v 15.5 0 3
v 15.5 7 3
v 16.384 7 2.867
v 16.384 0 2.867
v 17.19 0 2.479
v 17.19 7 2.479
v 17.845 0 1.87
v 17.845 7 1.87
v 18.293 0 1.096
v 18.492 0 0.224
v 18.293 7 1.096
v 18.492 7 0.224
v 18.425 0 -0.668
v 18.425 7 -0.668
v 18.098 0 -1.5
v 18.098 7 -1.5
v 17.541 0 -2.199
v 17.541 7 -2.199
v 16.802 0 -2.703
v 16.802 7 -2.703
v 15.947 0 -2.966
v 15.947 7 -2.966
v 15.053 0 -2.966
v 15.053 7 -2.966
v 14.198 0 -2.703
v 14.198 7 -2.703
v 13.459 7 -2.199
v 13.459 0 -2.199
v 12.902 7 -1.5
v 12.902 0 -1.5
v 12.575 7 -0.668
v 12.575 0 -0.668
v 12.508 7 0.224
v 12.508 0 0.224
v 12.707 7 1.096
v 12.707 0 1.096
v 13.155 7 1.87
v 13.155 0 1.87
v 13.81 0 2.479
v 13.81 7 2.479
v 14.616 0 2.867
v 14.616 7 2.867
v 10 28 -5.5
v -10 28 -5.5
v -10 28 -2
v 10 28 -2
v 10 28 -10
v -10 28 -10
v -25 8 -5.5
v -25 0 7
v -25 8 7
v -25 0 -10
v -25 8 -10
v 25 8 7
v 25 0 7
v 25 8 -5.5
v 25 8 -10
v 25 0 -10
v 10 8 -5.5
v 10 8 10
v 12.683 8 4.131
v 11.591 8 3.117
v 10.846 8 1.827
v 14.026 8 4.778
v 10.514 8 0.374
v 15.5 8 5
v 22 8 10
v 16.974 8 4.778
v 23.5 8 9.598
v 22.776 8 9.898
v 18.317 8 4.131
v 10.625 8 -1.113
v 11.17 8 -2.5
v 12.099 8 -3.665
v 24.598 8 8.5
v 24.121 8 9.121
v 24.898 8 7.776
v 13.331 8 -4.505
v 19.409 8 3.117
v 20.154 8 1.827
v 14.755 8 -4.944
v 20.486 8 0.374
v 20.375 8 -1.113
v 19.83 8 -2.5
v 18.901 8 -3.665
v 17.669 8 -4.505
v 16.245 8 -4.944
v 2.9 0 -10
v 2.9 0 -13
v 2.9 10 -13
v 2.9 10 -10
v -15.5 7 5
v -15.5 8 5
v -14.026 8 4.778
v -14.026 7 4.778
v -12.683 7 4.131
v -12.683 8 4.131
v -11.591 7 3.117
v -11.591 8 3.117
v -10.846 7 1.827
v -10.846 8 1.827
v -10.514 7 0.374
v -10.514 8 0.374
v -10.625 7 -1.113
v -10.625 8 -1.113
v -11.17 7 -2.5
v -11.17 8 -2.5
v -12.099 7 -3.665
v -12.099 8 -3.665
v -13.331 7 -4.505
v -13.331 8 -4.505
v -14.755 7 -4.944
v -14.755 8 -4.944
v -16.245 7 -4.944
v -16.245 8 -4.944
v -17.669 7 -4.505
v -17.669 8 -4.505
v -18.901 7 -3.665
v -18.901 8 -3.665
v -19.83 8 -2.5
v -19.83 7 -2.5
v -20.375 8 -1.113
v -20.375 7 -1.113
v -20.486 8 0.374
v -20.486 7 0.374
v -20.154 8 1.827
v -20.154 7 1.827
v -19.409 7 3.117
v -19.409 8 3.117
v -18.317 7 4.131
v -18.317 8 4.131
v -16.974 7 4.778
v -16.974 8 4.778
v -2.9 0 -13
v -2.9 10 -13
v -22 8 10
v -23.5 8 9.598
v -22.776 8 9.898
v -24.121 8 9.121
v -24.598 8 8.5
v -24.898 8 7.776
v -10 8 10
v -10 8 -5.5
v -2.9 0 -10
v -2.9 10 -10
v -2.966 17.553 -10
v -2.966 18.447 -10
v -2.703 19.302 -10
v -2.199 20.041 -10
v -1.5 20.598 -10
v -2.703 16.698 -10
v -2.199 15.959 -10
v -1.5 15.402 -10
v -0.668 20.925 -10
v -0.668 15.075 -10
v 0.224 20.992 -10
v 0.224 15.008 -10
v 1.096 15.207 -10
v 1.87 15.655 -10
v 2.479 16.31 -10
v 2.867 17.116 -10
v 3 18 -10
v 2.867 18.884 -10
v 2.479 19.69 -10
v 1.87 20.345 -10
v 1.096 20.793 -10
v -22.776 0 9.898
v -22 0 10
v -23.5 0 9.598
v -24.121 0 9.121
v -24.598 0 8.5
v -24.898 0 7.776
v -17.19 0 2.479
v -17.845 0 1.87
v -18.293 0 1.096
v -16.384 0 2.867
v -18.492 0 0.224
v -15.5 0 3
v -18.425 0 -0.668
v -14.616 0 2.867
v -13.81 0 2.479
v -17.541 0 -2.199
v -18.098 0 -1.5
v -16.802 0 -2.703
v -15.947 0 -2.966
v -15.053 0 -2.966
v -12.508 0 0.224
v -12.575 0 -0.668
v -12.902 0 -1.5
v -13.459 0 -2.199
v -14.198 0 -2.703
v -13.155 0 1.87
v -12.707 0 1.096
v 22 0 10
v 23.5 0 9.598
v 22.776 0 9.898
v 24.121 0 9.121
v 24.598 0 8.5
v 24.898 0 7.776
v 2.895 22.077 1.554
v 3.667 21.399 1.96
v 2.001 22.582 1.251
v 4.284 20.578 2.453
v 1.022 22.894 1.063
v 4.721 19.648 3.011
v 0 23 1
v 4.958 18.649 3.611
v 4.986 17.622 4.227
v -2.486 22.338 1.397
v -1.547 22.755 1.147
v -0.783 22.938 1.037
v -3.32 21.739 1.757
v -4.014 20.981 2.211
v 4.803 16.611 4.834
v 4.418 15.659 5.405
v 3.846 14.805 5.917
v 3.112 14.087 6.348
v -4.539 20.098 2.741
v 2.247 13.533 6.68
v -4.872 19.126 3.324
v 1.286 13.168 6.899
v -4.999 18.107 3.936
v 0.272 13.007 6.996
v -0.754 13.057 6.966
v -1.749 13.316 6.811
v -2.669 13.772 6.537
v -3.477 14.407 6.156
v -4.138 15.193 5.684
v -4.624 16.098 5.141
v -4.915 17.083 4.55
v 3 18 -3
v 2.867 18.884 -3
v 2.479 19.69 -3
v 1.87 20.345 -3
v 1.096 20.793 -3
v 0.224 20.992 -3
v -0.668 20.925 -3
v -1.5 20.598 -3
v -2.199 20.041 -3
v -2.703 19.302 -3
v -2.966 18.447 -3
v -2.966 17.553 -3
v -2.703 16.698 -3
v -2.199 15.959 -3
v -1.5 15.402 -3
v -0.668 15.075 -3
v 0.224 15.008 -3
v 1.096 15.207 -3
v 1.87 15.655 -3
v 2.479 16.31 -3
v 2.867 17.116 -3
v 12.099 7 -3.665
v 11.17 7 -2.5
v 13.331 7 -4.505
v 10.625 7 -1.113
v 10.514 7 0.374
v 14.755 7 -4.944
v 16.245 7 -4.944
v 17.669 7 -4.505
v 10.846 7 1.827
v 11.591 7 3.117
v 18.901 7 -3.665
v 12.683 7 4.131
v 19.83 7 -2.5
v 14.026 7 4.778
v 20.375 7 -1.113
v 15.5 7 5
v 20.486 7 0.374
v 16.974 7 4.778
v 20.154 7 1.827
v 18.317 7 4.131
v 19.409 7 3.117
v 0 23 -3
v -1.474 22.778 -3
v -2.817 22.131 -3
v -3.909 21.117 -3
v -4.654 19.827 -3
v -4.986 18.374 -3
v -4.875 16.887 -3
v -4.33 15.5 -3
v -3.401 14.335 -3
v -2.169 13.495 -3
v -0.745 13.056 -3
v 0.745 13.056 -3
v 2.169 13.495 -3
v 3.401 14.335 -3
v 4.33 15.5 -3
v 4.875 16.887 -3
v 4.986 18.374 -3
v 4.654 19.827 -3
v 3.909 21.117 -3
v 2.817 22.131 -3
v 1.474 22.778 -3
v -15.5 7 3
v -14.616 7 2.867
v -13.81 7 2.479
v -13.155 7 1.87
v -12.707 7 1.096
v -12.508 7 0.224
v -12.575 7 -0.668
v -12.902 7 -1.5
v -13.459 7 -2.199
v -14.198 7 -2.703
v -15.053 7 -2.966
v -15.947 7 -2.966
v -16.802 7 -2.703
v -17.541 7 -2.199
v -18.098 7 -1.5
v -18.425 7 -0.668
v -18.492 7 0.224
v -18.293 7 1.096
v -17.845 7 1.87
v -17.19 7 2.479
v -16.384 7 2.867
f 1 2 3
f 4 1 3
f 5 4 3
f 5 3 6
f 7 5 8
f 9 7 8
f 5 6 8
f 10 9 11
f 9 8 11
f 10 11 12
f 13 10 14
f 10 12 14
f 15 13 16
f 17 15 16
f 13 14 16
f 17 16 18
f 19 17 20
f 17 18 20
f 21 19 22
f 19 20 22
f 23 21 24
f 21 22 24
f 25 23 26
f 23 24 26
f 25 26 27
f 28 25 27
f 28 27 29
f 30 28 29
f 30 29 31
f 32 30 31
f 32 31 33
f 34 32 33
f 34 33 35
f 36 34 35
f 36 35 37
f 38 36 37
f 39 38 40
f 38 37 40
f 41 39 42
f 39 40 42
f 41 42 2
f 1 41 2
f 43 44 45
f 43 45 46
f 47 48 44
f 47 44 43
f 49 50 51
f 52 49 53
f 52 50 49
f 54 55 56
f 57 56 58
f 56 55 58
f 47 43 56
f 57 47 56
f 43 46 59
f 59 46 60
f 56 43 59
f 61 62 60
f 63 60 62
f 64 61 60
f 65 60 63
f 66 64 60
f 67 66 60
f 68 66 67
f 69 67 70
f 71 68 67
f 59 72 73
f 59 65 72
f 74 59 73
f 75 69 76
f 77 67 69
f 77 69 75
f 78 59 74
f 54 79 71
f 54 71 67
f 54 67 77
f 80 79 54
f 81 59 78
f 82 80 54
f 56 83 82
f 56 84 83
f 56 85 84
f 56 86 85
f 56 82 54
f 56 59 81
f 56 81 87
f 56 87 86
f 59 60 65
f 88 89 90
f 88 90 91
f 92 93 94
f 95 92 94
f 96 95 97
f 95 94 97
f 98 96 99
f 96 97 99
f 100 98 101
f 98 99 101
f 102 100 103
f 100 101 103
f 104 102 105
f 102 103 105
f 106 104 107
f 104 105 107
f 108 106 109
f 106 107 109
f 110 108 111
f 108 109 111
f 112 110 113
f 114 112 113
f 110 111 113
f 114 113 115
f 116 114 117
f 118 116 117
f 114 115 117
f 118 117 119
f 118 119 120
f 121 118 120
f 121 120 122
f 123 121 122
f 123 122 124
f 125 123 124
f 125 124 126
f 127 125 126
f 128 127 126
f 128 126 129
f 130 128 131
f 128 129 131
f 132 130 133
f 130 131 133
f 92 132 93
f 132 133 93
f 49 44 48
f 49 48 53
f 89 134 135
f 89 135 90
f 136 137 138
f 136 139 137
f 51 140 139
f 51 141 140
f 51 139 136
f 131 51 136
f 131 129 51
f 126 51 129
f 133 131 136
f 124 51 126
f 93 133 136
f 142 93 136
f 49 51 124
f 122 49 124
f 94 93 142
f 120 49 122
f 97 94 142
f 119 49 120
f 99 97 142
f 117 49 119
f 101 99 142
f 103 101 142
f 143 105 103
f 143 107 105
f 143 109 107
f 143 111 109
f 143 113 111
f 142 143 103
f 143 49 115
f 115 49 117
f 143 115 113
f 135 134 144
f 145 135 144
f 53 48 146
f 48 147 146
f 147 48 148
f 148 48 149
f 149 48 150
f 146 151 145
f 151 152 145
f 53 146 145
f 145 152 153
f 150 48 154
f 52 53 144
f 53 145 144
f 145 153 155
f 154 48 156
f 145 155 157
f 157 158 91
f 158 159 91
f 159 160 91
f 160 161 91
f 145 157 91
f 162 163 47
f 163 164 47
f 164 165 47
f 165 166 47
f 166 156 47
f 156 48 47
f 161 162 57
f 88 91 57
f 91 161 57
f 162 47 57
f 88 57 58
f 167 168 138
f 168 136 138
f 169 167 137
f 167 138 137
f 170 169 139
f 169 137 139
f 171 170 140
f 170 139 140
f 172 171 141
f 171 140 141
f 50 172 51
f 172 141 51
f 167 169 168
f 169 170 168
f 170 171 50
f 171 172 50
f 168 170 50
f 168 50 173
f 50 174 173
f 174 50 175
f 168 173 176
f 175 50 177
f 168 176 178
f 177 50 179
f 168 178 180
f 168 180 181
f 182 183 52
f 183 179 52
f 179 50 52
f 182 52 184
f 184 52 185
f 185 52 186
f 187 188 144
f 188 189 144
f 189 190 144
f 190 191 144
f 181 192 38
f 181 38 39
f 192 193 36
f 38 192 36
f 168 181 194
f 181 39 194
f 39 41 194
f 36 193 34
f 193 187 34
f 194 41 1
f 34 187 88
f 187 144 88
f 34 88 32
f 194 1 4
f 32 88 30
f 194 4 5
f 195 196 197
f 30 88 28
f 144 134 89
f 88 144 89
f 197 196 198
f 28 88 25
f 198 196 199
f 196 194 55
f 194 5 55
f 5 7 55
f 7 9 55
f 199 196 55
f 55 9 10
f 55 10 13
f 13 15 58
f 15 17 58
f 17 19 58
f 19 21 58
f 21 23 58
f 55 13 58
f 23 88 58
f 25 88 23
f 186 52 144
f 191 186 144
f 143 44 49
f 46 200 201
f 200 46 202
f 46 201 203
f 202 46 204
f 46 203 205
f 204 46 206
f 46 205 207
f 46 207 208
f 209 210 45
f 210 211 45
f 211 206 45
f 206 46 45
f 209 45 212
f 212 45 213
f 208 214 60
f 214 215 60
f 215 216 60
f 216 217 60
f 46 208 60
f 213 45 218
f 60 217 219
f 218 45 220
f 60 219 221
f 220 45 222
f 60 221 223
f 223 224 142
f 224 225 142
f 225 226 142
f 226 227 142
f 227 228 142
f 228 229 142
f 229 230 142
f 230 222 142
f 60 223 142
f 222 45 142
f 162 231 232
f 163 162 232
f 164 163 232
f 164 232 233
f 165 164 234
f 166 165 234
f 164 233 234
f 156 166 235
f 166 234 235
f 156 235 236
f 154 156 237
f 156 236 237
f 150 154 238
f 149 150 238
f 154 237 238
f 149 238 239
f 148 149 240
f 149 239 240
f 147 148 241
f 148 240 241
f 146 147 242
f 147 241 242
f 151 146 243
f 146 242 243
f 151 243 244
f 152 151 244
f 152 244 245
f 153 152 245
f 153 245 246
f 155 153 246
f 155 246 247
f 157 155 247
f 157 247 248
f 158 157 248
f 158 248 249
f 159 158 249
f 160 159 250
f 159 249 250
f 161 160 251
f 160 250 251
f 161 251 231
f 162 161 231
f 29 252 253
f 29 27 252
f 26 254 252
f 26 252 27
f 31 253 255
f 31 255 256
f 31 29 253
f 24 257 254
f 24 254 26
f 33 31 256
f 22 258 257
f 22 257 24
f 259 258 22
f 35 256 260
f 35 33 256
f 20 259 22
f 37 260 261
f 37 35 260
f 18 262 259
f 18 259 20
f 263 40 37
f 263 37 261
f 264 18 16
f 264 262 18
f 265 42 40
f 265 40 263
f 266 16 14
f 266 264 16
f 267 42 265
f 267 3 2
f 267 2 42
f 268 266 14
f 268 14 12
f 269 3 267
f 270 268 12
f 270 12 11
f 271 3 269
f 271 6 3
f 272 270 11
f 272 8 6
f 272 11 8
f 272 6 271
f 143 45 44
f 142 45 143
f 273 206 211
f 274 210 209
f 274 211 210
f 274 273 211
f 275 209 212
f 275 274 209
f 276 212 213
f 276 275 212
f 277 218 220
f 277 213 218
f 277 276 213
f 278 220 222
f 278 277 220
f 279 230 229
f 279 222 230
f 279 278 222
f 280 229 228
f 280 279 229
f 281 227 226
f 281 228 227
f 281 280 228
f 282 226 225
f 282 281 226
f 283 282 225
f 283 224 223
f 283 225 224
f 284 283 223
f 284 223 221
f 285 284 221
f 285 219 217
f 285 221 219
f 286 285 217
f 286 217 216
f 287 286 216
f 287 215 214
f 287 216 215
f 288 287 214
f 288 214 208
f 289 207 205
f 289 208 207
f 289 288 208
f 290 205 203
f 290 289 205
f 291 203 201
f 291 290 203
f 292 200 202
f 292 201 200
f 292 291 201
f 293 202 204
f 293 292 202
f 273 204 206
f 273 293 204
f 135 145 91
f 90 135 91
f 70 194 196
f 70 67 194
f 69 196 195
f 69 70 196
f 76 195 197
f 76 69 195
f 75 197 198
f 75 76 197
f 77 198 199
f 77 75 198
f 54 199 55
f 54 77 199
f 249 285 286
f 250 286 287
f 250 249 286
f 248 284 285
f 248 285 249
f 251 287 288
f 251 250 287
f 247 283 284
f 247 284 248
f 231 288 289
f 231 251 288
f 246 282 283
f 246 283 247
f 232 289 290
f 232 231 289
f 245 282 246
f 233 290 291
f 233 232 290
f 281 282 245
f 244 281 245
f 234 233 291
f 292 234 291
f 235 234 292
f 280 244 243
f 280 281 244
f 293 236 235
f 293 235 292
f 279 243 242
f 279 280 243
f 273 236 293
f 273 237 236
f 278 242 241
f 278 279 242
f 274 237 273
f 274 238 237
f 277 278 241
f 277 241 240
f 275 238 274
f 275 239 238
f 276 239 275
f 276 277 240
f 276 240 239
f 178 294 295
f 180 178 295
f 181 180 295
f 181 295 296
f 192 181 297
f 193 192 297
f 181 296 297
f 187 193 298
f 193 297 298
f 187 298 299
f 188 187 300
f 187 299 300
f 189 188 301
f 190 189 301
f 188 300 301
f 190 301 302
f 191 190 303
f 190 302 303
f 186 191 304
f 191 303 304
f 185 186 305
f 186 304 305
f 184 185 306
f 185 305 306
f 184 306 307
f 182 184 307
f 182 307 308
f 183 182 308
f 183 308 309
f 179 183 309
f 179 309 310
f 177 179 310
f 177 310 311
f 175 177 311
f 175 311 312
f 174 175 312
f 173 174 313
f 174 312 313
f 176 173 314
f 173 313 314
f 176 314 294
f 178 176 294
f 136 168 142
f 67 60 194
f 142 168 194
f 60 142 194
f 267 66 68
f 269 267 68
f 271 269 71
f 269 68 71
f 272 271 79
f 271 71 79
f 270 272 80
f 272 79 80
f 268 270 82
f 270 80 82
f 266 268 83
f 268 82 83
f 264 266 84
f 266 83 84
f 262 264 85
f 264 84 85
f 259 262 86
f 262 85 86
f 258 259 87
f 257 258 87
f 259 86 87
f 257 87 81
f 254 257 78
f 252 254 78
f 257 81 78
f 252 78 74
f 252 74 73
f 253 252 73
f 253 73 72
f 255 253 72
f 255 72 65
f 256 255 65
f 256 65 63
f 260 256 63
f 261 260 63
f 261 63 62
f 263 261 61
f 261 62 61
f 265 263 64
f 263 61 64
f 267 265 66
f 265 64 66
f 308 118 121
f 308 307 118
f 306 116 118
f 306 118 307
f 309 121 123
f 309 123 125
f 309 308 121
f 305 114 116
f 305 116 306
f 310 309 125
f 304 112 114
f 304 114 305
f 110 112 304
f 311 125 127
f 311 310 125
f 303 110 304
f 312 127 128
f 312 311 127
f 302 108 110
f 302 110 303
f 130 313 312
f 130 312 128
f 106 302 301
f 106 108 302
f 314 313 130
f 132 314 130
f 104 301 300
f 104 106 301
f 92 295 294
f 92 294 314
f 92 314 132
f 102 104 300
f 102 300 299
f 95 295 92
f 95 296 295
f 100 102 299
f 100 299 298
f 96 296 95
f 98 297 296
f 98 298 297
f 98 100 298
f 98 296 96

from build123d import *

# Parameters (mm, degrees)
SKETCH1_W           = 50
SKETCH1_H           = 20
BOSS_EXTRUDE1_DEPTH = 8
SKETCH2_W           = 20
SKETCH2_H           = 8
BOSS_EXTRUDE2_DEPTH = 20
RIB3_REACH          = 40.846
SKETCH3_WALL_W      = 103.015505978
SKETCH3_WALL_H      = 20
CUT_EXTRUDE3_START  = -3
SKETCH9_R           = 5
CUT_EXTRUDE3_DEPTH  = 12
SKETCH10_R          = 3
CUT_EXTRUDE4_DEPTH  = 7
RIB4_REACH          = 44.532
SKETCH12_WALL_W     = 112.064681272
SKETCH12_WALL_H     = 4.5
RIB7_REACH          = 44.532
SKETCH13_WALL_W     = 112.064681272
SKETCH13_WALL_H     = 4.5
SKETCH7_R           = 5
CUT_EXTRUDE5_DEPTH  = 1
SKETCH14_R          = 3
CUT_EXTRUDE6_DEPTH  = 7
LPATTERN1_COUNT     = 2
LPATTERN1_PITCH     = 31
SKETCH15_W          = 5.8
SKETCH15_H          = 3
BOSS_EXTRUDE3_DEPTH = 10
FILLET1_R           = 3
FILLET2_R           = 3


with BuildPart() as part:
    # Sketch1 → Boss-Extrude1 (new body)
    with BuildSketch(Plane(origin=(0, 0, 0), x_dir=(1, 0, 0), z_dir=(0, 1, 0))):
        Rectangle(SKETCH1_W, SKETCH1_H)
    extrude(amount=BOSS_EXTRUDE1_DEPTH)

    # Sketch2 → Boss-Extrude2 (add)
    with BuildSketch(Plane(origin=(0, 8, 0), x_dir=(1, 0, 0), z_dir=(0, 1, 0))):
        with Locations((0, 6)):
            Rectangle(SKETCH2_W, SKETCH2_H)
    extrude(amount=BOSS_EXTRUDE2_DEPTH)

    # Sketch3 wall → Rib3 (add, up to next)
    with BuildSketch(Plane(origin=(0, 18, 4), x_dir=(0, -0.857492925713, 0.514495755428), z_dir=(0, -0.514495755428, -0.857492925713)), mode=Mode.PRIVATE) as rib3_sk1:
        Rectangle(SKETCH3_WALL_W, SKETCH3_WALL_H)
    rib3_tool1 = extrude(rib3_sk1.sketch, amount=RIB3_REACH, mode=Mode.PRIVATE) - part.part
    add(rib3_tool1.solids().sort_by_distance((0, 18, 4))[0])

    # Sketch9 → Cut-Extrude3 (cut)
    with BuildSketch(Plane.XY.offset(CUT_EXTRUDE3_START)):
        with Locations(Location((0, 18, 0), (0, 0, 90))):
            Circle(SKETCH9_R)
    extrude(amount=CUT_EXTRUDE3_DEPTH, mode=Mode.SUBTRACT)

    # Sketch10 → Cut-Extrude4 (cut)
    with BuildSketch(Plane.XY.offset(-3)):
        with Locations((0, 18)):
            Circle(SKETCH10_R)
    extrude(amount=-CUT_EXTRUDE4_DEPTH, mode=Mode.SUBTRACT)

    # Sketch12 wall → Rib4 (add, up to next)
    with BuildSketch(Plane(origin=(-17.5, 18, -10), x_dir=(-0.6, -0.8, 0), z_dir=(-0.8, 0.6, 0)), mode=Mode.PRIVATE) as rib4_sk1:
        with Locations((0, 2.25)):
            Rectangle(SKETCH12_WALL_W, SKETCH12_WALL_H)
    rib4_tool1 = extrude(rib4_sk1.sketch, amount=-RIB4_REACH, mode=Mode.PRIVATE) - part.part
    add(rib4_tool1.solids().sort_by_distance((-17.5, 18, -10))[0])

    # Sketch13 wall → Rib7 (add, up to next)
    with BuildSketch(Plane(origin=(17.5, 18, -10), x_dir=(0.6, -0.8, 0), z_dir=(-0.8, -0.6, 0)), mode=Mode.PRIVATE) as rib7_sk1:
        with Locations((0, 2.25)):
            Rectangle(SKETCH13_WALL_W, SKETCH13_WALL_H)
    rib7_tool1 = extrude(rib7_sk1.sketch, amount=RIB7_REACH, mode=Mode.PRIVATE) - part.part
    add(rib7_tool1.solids().sort_by_distance((17.5, 18, -10))[0])

    # Sketch7 → Cut-Extrude5 (cut)
    with BuildSketch(Plane(origin=(0, 8, 0), x_dir=(1, 0, 0), z_dir=(0, 1, 0))):
        with Locations(Location((-15.5, 0, 0), (0, 0, 270))):
            Circle(SKETCH7_R)
    cut_extrude5 = extrude(amount=-CUT_EXTRUDE5_DEPTH, mode=Mode.SUBTRACT)

    # Sketch14 → Cut-Extrude6 (cut)
    with BuildSketch(Plane(origin=(0, 7, 0), x_dir=(1, 0, 0), z_dir=(0, 1, 0))):
        with Locations(Location((-15.5, 0, 0), (0, 0, 270))):
            Circle(SKETCH14_R)
    cut_extrude6 = extrude(amount=-CUT_EXTRUDE6_DEPTH, mode=Mode.SUBTRACT)

    # LPattern1: Cut-Extrude5, Cut-Extrude6 ×2
    with Locations(*[(i * LPATTERN1_PITCH, 0, 0) for i in range(1, LPATTERN1_COUNT)]):
        add(cut_extrude5, mode=Mode.SUBTRACT)
        add(cut_extrude6, mode=Mode.SUBTRACT)

    # Sketch15 → Boss-Extrude3 (add)
    with BuildSketch(Plane.XZ):
        with Locations((0, -11.5)):
            Rectangle(SKETCH15_W, SKETCH15_H)
    extrude(amount=-BOSS_EXTRUDE3_DEPTH)

    # Fillet1
    fillet1_edges = [part.edges().sort_by_distance(p)[0] for p in [
        (-25, 4, 10),
    ]]
    fillet(fillet1_edges, radius=FILLET1_R)

    # Fillet2
    fillet2_edges = [part.edges().sort_by_distance(p)[0] for p in [
        (25, 4, 10),
    ]]
    fillet(fillet2_edges, radius=FILLET2_R)


solid = part.part
